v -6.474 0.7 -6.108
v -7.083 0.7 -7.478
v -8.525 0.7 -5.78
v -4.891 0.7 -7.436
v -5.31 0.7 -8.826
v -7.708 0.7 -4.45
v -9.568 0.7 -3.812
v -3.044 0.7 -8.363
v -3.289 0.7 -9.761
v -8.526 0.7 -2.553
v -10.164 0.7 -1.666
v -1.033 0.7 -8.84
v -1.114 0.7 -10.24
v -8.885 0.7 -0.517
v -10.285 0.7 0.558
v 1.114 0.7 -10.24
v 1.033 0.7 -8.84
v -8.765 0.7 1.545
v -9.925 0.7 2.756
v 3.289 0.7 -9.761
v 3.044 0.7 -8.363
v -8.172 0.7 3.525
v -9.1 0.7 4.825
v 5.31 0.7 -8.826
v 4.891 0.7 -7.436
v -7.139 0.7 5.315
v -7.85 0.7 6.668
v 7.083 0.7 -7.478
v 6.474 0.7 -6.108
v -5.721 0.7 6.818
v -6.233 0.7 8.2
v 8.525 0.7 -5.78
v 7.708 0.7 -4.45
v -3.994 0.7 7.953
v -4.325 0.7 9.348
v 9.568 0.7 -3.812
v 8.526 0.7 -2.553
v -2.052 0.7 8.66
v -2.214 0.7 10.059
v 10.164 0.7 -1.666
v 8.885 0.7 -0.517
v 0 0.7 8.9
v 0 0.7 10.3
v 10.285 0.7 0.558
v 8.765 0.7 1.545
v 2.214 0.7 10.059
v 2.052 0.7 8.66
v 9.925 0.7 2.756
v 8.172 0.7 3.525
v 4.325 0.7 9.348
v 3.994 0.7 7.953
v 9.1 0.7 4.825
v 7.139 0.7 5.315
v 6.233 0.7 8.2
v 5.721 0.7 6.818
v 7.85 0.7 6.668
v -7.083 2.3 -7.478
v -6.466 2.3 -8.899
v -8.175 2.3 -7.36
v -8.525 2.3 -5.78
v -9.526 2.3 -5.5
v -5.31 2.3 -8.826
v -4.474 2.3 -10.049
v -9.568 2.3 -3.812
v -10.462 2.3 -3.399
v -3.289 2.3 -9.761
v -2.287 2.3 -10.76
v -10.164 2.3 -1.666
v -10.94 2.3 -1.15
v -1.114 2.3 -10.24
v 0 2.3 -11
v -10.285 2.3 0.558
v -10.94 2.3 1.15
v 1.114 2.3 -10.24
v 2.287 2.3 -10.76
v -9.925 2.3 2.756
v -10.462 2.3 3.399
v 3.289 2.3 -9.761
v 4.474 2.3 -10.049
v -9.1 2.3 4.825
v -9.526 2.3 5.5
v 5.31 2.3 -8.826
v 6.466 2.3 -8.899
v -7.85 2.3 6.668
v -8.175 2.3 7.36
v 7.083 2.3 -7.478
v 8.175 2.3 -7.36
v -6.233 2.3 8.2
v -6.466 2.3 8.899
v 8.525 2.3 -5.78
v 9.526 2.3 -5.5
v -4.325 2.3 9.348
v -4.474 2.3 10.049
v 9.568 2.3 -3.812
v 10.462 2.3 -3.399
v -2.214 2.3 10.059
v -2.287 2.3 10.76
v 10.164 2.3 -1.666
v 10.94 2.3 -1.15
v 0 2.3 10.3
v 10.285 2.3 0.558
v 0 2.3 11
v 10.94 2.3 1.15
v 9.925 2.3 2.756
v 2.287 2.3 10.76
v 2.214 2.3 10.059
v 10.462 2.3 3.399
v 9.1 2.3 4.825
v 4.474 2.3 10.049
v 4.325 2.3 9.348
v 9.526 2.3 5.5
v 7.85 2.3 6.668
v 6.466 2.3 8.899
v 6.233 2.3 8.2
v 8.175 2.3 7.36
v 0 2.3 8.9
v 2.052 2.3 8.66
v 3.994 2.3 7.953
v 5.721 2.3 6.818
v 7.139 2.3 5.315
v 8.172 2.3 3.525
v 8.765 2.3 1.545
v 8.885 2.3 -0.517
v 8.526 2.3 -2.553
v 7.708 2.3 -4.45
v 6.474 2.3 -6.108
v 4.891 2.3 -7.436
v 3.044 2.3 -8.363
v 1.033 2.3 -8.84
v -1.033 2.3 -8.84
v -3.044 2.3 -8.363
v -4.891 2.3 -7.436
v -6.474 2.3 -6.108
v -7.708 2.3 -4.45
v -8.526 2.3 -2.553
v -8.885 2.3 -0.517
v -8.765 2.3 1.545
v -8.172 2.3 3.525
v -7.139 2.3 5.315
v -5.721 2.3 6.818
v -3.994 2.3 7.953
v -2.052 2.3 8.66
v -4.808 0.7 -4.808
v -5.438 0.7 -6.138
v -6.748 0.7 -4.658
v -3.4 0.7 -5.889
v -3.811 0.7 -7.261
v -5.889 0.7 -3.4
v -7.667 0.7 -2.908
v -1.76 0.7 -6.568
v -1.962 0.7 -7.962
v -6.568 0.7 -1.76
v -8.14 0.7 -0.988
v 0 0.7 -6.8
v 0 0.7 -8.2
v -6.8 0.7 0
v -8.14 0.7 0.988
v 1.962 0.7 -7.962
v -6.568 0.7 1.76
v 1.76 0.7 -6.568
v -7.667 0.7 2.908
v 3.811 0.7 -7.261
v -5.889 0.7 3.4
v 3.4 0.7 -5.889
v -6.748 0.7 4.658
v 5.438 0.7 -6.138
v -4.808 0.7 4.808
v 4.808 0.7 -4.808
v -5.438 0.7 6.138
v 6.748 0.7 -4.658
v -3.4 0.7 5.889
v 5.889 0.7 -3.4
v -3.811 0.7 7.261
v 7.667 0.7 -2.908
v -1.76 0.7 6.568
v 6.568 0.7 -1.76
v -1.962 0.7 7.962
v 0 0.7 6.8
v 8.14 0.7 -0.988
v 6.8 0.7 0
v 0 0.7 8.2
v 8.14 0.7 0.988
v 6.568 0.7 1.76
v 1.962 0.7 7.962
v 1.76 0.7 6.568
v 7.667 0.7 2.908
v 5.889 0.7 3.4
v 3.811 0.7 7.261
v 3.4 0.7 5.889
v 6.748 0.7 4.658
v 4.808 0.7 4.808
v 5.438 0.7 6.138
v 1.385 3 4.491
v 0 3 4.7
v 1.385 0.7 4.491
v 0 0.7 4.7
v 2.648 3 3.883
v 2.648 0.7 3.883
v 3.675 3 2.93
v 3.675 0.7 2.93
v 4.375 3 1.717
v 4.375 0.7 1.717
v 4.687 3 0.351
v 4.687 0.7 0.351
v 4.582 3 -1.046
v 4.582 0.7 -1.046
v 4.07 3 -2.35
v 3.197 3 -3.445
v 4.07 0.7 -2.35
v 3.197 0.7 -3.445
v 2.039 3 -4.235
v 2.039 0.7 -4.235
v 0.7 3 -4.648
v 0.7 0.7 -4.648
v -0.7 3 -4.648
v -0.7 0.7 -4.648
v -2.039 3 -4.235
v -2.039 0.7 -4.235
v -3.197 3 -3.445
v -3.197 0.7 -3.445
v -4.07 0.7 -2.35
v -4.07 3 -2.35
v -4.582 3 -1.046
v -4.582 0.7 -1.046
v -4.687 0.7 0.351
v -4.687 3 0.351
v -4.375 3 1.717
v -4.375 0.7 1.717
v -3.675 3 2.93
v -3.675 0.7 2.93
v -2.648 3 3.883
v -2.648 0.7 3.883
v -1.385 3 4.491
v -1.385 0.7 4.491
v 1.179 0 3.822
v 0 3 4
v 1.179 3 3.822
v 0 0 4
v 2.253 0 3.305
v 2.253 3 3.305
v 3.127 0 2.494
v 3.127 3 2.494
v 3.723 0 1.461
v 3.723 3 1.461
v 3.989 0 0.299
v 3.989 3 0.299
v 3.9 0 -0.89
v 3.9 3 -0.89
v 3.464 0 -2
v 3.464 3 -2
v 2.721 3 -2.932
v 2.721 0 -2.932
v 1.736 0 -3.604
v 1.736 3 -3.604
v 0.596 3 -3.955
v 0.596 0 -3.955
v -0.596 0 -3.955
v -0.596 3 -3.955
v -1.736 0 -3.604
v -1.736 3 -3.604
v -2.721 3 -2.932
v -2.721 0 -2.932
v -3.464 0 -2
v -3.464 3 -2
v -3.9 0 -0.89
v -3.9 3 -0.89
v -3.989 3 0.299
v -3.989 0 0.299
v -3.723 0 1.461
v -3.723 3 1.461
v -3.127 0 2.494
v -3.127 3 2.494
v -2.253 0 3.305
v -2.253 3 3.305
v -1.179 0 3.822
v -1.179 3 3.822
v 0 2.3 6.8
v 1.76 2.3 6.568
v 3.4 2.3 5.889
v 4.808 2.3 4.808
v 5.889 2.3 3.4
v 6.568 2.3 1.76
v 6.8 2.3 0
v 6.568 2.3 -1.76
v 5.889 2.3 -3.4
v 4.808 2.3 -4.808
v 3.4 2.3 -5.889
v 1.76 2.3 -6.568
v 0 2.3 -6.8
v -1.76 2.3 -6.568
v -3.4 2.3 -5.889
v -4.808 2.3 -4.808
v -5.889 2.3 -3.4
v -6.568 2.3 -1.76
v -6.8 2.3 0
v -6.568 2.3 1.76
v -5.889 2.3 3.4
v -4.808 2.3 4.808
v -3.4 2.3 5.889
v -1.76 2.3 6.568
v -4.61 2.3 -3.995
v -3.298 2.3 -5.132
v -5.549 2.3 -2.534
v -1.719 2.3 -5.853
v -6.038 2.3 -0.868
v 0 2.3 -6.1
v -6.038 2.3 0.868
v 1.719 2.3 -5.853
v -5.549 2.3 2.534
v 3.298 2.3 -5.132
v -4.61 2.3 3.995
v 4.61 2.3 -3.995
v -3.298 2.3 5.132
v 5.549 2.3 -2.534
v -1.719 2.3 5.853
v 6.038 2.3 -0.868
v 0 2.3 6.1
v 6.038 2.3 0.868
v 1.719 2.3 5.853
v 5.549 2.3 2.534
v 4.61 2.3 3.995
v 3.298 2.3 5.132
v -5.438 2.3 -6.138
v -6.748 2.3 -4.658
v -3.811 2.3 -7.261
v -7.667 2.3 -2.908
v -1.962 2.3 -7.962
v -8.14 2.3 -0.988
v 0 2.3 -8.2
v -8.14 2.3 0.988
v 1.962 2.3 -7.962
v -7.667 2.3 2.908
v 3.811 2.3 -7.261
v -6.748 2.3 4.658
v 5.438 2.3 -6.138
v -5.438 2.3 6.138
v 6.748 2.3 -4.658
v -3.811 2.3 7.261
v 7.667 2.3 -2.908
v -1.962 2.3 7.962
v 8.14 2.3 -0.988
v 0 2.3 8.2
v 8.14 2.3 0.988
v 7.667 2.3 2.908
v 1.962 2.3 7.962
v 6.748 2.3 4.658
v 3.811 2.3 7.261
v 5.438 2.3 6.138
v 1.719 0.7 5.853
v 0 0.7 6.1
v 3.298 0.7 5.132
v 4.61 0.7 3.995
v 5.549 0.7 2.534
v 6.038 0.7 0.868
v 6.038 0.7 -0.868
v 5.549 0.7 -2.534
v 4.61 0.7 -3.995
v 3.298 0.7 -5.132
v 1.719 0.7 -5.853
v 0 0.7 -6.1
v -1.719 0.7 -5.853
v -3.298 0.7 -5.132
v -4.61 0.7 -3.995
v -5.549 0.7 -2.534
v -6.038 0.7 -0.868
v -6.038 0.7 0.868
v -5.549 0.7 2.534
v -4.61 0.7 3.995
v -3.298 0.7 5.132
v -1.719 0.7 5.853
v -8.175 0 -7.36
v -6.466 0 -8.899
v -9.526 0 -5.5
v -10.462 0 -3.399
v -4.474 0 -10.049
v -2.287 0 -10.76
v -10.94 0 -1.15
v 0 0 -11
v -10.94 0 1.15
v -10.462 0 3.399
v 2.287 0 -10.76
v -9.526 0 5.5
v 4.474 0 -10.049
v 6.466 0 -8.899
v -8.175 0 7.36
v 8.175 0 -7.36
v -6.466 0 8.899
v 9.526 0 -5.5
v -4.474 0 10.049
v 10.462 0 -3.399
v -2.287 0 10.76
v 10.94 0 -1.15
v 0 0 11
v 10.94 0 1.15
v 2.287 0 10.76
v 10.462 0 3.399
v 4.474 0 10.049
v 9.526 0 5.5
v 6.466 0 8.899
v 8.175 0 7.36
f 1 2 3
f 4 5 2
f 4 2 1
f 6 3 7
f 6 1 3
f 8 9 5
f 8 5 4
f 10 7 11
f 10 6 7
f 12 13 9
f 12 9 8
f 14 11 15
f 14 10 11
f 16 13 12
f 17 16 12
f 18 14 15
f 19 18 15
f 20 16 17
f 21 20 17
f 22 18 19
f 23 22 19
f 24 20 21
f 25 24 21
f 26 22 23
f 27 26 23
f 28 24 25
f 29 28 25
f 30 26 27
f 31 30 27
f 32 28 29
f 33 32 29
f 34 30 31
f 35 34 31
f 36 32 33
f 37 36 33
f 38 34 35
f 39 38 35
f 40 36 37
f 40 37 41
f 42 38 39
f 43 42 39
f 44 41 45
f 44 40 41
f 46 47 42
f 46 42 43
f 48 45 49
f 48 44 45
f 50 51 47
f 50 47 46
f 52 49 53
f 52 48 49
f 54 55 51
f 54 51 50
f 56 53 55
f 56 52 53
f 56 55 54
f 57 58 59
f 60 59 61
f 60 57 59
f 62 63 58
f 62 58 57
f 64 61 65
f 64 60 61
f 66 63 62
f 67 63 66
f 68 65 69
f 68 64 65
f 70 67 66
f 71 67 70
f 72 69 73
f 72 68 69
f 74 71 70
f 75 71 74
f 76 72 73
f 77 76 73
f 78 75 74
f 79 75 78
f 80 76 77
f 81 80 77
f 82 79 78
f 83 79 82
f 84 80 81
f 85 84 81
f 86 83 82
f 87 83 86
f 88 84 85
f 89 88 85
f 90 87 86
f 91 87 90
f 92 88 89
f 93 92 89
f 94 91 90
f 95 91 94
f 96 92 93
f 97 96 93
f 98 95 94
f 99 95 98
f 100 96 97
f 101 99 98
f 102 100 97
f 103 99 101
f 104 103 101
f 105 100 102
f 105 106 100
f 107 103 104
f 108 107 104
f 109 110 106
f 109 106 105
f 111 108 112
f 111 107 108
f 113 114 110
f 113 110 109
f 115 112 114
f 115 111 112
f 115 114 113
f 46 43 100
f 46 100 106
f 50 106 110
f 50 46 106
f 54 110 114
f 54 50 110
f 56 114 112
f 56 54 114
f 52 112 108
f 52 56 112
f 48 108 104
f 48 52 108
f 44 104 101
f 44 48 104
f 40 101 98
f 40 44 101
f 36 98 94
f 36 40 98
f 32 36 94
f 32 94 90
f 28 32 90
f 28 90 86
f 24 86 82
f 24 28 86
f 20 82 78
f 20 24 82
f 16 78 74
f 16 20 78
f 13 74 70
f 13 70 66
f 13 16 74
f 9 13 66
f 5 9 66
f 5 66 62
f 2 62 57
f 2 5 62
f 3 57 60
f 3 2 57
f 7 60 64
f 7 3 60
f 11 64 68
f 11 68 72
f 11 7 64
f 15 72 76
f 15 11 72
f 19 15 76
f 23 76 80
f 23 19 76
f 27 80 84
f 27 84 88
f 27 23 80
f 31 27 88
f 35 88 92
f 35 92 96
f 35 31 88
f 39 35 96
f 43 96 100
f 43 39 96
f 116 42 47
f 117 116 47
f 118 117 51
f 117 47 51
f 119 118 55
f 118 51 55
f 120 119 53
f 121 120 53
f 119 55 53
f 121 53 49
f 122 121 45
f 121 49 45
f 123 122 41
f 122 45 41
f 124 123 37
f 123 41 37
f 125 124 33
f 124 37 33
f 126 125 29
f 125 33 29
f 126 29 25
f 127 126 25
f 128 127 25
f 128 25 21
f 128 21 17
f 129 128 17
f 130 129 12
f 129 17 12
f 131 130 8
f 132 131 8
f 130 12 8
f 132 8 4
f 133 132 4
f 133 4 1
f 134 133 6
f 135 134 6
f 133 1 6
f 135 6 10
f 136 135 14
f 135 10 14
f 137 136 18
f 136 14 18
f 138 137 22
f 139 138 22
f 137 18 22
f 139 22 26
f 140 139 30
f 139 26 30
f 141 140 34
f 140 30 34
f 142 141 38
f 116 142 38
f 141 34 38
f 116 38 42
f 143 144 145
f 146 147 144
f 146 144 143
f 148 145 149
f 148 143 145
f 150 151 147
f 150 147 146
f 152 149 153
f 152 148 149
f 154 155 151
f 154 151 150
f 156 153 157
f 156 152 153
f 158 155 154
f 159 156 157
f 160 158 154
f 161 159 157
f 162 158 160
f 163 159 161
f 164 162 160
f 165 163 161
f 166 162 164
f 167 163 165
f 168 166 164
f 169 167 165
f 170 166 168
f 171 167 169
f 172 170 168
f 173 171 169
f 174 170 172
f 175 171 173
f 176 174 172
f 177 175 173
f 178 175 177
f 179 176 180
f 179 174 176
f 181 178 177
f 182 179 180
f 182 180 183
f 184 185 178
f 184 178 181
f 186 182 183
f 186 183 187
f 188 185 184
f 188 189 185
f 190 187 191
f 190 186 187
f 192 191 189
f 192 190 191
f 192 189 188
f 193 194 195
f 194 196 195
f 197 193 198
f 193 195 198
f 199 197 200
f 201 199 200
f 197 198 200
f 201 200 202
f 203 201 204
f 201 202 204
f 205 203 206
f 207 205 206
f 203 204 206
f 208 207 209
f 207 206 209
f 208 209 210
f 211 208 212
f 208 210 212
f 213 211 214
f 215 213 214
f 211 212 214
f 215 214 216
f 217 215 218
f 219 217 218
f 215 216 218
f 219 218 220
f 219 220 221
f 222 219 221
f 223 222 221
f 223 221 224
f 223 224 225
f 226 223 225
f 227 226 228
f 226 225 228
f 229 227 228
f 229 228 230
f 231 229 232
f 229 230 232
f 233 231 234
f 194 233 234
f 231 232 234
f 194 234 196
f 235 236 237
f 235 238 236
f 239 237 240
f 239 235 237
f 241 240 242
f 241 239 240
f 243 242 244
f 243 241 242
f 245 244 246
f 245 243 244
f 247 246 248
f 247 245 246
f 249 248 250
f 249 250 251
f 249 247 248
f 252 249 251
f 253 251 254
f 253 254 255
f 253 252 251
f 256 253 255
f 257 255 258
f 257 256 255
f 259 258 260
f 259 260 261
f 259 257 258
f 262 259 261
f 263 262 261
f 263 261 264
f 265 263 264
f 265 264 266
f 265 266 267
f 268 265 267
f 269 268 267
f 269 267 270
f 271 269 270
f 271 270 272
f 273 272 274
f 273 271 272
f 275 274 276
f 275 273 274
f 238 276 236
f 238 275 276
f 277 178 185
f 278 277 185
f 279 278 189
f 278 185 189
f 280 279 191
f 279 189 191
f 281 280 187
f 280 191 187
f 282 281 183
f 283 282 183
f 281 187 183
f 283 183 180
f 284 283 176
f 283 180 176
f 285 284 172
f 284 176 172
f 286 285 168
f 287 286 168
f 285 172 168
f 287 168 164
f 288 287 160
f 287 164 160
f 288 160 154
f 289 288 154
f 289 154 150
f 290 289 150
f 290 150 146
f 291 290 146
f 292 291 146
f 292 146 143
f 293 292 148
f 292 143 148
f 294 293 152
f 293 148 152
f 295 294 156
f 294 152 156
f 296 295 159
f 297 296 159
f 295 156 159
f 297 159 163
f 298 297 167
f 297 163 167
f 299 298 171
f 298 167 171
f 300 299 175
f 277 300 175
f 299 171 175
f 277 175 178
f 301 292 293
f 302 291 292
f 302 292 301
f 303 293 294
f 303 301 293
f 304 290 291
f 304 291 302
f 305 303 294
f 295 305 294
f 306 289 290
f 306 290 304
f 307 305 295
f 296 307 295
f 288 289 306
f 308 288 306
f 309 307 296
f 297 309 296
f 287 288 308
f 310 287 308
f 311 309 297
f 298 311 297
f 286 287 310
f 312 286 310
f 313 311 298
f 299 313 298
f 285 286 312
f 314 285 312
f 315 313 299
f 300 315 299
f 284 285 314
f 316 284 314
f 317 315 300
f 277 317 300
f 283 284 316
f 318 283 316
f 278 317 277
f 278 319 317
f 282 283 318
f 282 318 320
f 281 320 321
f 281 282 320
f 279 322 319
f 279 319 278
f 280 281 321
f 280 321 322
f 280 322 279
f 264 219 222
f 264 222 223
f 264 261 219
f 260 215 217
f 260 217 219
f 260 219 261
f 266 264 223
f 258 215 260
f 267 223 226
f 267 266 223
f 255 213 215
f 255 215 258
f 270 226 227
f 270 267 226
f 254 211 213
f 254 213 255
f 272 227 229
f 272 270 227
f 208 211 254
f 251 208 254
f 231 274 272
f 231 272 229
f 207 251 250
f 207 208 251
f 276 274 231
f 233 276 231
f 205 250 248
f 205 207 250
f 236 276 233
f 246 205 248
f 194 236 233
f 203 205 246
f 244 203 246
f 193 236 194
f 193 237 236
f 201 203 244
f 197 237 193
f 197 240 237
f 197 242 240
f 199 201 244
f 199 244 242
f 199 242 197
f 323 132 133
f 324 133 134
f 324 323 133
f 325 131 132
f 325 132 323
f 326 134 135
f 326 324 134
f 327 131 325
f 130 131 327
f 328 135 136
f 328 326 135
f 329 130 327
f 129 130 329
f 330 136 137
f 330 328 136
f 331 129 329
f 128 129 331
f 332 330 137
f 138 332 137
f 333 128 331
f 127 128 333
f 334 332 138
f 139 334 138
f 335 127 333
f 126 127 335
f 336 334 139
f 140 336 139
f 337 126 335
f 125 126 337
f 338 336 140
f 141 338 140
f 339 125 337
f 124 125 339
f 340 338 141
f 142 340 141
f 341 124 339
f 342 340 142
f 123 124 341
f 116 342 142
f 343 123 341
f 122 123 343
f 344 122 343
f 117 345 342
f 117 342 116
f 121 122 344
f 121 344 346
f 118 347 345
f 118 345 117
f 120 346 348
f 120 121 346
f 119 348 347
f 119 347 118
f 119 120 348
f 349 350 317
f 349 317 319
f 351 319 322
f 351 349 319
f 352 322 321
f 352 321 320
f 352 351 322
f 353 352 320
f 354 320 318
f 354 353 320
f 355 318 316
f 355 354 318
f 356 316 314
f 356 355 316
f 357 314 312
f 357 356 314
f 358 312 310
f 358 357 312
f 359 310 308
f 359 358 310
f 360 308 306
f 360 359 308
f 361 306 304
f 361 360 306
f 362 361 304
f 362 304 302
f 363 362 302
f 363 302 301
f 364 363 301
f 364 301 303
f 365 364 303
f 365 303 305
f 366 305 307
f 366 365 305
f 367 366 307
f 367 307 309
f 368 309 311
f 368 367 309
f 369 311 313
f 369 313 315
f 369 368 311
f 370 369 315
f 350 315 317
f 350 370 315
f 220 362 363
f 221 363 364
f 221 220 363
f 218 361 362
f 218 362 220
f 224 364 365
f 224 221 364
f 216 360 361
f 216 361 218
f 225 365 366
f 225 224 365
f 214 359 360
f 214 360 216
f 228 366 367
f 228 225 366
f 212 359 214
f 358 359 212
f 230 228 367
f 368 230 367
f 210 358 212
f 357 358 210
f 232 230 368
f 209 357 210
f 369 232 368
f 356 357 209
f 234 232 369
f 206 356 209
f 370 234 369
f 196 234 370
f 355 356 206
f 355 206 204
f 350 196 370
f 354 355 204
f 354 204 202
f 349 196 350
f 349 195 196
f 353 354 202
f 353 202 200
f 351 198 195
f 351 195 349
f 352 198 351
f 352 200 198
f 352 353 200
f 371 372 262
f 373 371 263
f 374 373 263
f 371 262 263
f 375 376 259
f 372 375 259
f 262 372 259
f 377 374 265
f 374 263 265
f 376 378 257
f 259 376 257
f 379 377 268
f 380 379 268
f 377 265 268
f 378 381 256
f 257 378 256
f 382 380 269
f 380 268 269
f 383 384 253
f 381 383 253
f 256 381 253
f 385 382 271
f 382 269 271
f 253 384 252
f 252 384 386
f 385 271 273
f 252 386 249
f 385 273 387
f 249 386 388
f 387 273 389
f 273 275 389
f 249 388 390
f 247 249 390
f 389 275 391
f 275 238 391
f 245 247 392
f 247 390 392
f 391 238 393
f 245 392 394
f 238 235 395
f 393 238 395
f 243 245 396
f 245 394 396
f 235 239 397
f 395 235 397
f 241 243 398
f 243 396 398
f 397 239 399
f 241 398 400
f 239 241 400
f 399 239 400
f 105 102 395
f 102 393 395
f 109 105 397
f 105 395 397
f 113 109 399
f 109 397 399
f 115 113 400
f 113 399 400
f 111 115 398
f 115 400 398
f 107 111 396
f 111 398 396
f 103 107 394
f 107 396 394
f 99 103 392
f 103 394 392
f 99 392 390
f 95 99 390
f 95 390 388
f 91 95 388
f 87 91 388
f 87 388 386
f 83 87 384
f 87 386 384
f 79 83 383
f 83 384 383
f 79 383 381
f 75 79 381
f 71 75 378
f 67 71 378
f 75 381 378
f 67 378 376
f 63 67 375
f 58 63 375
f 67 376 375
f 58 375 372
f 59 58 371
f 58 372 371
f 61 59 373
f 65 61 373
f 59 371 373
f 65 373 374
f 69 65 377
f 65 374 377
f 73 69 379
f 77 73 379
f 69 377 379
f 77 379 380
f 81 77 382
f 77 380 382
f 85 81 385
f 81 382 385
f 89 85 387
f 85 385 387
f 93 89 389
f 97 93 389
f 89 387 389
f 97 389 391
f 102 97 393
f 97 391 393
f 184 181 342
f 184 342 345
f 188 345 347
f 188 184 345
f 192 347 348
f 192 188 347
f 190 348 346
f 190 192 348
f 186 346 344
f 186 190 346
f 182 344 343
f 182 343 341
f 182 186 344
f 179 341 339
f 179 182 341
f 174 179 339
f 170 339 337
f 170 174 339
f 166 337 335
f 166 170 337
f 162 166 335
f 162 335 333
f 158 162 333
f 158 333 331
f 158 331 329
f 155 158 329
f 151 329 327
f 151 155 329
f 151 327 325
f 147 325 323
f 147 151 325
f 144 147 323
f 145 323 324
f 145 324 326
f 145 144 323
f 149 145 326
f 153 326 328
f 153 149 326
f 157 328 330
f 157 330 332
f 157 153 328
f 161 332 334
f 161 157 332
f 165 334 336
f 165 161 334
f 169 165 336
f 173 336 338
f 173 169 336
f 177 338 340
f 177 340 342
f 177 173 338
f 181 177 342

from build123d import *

# Parameters (mm, degrees)
CROQUIS1_R     = 11
CROQUIS1_R_2   = 4
EXTRUIR1_DEPTH = 0.7
CROQUIS2_R     = 11
CROQUIS2_R_2   = 10.3
CROQUIS2_R_3   = 8.9
CROQUIS2_R_4   = 8.2
CROQUIS2_R_5   = 6.8
CROQUIS2_R_6   = 6.1
CROQUIS2_R_7   = 4.7
CROQUIS2_R_8   = 4
EXTRUIR2_DEPTH = 1.6
CROQUIS3_R     = 4.7
CROQUIS3_R_2   = 4
EXTRUIR3_DEPTH = 0.7


with BuildPart() as part:
    # Croquis1 → Extruir1 (new body)
    with BuildSketch(Plane(origin=(0, 0, 0), x_dir=(1, 0, 0), z_dir=(0, 1, 0))):
        with Locations(Location((0, 0, 0), (0, 0, 270))):
            Circle(CROQUIS1_R)
        with Locations(Location((0, 0, 0), (0, 0, 270))):
            Circle(CROQUIS1_R_2, mode=Mode.SUBTRACT)
    extrude(amount=EXTRUIR1_DEPTH)

    # Croquis2 → Extruir2 (add)
    # profile 1 of 4: a face of its own
    with BuildSketch(Plane(origin=(0, 0.7, 0), x_dir=(1, 0, 0), z_dir=(0, 1, 0))):
        with Locations(Location((0, 0, 0), (0, 0, 270))):
            Circle(CROQUIS2_R)
        with Locations(Location((0, 0, 0), (0, 0, 270))):
            Circle(CROQUIS2_R_2, mode=Mode.SUBTRACT)
    # profile 2 of 4: a face of its own
    with BuildSketch(Plane(origin=(0, 0.7, 0), x_dir=(1, 0, 0), z_dir=(0, 1, 0))):
        with Locations(Location((0, 0, 0), (0, 0, 270))):
            Circle(CROQUIS2_R_3)
        with Locations(Location((0, 0, 0), (0, 0, 270))):
            Circle(CROQUIS2_R_4, mode=Mode.SUBTRACT)
    # profile 3 of 4: a face of its own
    with BuildSketch(Plane(origin=(0, 0.7, 0), x_dir=(1, 0, 0), z_dir=(0, 1, 0))):
        with Locations(Location((0, 0, 0), (0, 0, 270))):
            Circle(CROQUIS2_R_5)
        with Locations(Location((0, 0, 0), (0, 0, 270))):
            Circle(CROQUIS2_R_6, mode=Mode.SUBTRACT)
    # profile 4 of 4: a face of its own
    with BuildSketch(Plane(origin=(0, 0.7, 0), x_dir=(1, 0, 0), z_dir=(0, 1, 0))):
        with Locations(Location((0, 0, 0), (0, 0, 270))):
            Circle(CROQUIS2_R_7)
        with Locations(Location((0, 0, 0), (0, 0, 270))):
            Circle(CROQUIS2_R_8, mode=Mode.SUBTRACT)
    extrude(amount=EXTRUIR2_DEPTH)

    # Croquis3 → Extruir3 (add)
    with BuildSketch(Plane(origin=(0, 2.3, 0), x_dir=(1, 0, 0), z_dir=(0, 1, 0))):
        with Locations(Location((0, 0, 0), (0, 0, 270))):
            Circle(CROQUIS3_R)
        with Locations(Location((0, 0, 0), (0, 0, 270))):
            Circle(CROQUIS3_R_2, mode=Mode.SUBTRACT)
    extrude(amount=EXTRUIR3_DEPTH)


solid = part.part
